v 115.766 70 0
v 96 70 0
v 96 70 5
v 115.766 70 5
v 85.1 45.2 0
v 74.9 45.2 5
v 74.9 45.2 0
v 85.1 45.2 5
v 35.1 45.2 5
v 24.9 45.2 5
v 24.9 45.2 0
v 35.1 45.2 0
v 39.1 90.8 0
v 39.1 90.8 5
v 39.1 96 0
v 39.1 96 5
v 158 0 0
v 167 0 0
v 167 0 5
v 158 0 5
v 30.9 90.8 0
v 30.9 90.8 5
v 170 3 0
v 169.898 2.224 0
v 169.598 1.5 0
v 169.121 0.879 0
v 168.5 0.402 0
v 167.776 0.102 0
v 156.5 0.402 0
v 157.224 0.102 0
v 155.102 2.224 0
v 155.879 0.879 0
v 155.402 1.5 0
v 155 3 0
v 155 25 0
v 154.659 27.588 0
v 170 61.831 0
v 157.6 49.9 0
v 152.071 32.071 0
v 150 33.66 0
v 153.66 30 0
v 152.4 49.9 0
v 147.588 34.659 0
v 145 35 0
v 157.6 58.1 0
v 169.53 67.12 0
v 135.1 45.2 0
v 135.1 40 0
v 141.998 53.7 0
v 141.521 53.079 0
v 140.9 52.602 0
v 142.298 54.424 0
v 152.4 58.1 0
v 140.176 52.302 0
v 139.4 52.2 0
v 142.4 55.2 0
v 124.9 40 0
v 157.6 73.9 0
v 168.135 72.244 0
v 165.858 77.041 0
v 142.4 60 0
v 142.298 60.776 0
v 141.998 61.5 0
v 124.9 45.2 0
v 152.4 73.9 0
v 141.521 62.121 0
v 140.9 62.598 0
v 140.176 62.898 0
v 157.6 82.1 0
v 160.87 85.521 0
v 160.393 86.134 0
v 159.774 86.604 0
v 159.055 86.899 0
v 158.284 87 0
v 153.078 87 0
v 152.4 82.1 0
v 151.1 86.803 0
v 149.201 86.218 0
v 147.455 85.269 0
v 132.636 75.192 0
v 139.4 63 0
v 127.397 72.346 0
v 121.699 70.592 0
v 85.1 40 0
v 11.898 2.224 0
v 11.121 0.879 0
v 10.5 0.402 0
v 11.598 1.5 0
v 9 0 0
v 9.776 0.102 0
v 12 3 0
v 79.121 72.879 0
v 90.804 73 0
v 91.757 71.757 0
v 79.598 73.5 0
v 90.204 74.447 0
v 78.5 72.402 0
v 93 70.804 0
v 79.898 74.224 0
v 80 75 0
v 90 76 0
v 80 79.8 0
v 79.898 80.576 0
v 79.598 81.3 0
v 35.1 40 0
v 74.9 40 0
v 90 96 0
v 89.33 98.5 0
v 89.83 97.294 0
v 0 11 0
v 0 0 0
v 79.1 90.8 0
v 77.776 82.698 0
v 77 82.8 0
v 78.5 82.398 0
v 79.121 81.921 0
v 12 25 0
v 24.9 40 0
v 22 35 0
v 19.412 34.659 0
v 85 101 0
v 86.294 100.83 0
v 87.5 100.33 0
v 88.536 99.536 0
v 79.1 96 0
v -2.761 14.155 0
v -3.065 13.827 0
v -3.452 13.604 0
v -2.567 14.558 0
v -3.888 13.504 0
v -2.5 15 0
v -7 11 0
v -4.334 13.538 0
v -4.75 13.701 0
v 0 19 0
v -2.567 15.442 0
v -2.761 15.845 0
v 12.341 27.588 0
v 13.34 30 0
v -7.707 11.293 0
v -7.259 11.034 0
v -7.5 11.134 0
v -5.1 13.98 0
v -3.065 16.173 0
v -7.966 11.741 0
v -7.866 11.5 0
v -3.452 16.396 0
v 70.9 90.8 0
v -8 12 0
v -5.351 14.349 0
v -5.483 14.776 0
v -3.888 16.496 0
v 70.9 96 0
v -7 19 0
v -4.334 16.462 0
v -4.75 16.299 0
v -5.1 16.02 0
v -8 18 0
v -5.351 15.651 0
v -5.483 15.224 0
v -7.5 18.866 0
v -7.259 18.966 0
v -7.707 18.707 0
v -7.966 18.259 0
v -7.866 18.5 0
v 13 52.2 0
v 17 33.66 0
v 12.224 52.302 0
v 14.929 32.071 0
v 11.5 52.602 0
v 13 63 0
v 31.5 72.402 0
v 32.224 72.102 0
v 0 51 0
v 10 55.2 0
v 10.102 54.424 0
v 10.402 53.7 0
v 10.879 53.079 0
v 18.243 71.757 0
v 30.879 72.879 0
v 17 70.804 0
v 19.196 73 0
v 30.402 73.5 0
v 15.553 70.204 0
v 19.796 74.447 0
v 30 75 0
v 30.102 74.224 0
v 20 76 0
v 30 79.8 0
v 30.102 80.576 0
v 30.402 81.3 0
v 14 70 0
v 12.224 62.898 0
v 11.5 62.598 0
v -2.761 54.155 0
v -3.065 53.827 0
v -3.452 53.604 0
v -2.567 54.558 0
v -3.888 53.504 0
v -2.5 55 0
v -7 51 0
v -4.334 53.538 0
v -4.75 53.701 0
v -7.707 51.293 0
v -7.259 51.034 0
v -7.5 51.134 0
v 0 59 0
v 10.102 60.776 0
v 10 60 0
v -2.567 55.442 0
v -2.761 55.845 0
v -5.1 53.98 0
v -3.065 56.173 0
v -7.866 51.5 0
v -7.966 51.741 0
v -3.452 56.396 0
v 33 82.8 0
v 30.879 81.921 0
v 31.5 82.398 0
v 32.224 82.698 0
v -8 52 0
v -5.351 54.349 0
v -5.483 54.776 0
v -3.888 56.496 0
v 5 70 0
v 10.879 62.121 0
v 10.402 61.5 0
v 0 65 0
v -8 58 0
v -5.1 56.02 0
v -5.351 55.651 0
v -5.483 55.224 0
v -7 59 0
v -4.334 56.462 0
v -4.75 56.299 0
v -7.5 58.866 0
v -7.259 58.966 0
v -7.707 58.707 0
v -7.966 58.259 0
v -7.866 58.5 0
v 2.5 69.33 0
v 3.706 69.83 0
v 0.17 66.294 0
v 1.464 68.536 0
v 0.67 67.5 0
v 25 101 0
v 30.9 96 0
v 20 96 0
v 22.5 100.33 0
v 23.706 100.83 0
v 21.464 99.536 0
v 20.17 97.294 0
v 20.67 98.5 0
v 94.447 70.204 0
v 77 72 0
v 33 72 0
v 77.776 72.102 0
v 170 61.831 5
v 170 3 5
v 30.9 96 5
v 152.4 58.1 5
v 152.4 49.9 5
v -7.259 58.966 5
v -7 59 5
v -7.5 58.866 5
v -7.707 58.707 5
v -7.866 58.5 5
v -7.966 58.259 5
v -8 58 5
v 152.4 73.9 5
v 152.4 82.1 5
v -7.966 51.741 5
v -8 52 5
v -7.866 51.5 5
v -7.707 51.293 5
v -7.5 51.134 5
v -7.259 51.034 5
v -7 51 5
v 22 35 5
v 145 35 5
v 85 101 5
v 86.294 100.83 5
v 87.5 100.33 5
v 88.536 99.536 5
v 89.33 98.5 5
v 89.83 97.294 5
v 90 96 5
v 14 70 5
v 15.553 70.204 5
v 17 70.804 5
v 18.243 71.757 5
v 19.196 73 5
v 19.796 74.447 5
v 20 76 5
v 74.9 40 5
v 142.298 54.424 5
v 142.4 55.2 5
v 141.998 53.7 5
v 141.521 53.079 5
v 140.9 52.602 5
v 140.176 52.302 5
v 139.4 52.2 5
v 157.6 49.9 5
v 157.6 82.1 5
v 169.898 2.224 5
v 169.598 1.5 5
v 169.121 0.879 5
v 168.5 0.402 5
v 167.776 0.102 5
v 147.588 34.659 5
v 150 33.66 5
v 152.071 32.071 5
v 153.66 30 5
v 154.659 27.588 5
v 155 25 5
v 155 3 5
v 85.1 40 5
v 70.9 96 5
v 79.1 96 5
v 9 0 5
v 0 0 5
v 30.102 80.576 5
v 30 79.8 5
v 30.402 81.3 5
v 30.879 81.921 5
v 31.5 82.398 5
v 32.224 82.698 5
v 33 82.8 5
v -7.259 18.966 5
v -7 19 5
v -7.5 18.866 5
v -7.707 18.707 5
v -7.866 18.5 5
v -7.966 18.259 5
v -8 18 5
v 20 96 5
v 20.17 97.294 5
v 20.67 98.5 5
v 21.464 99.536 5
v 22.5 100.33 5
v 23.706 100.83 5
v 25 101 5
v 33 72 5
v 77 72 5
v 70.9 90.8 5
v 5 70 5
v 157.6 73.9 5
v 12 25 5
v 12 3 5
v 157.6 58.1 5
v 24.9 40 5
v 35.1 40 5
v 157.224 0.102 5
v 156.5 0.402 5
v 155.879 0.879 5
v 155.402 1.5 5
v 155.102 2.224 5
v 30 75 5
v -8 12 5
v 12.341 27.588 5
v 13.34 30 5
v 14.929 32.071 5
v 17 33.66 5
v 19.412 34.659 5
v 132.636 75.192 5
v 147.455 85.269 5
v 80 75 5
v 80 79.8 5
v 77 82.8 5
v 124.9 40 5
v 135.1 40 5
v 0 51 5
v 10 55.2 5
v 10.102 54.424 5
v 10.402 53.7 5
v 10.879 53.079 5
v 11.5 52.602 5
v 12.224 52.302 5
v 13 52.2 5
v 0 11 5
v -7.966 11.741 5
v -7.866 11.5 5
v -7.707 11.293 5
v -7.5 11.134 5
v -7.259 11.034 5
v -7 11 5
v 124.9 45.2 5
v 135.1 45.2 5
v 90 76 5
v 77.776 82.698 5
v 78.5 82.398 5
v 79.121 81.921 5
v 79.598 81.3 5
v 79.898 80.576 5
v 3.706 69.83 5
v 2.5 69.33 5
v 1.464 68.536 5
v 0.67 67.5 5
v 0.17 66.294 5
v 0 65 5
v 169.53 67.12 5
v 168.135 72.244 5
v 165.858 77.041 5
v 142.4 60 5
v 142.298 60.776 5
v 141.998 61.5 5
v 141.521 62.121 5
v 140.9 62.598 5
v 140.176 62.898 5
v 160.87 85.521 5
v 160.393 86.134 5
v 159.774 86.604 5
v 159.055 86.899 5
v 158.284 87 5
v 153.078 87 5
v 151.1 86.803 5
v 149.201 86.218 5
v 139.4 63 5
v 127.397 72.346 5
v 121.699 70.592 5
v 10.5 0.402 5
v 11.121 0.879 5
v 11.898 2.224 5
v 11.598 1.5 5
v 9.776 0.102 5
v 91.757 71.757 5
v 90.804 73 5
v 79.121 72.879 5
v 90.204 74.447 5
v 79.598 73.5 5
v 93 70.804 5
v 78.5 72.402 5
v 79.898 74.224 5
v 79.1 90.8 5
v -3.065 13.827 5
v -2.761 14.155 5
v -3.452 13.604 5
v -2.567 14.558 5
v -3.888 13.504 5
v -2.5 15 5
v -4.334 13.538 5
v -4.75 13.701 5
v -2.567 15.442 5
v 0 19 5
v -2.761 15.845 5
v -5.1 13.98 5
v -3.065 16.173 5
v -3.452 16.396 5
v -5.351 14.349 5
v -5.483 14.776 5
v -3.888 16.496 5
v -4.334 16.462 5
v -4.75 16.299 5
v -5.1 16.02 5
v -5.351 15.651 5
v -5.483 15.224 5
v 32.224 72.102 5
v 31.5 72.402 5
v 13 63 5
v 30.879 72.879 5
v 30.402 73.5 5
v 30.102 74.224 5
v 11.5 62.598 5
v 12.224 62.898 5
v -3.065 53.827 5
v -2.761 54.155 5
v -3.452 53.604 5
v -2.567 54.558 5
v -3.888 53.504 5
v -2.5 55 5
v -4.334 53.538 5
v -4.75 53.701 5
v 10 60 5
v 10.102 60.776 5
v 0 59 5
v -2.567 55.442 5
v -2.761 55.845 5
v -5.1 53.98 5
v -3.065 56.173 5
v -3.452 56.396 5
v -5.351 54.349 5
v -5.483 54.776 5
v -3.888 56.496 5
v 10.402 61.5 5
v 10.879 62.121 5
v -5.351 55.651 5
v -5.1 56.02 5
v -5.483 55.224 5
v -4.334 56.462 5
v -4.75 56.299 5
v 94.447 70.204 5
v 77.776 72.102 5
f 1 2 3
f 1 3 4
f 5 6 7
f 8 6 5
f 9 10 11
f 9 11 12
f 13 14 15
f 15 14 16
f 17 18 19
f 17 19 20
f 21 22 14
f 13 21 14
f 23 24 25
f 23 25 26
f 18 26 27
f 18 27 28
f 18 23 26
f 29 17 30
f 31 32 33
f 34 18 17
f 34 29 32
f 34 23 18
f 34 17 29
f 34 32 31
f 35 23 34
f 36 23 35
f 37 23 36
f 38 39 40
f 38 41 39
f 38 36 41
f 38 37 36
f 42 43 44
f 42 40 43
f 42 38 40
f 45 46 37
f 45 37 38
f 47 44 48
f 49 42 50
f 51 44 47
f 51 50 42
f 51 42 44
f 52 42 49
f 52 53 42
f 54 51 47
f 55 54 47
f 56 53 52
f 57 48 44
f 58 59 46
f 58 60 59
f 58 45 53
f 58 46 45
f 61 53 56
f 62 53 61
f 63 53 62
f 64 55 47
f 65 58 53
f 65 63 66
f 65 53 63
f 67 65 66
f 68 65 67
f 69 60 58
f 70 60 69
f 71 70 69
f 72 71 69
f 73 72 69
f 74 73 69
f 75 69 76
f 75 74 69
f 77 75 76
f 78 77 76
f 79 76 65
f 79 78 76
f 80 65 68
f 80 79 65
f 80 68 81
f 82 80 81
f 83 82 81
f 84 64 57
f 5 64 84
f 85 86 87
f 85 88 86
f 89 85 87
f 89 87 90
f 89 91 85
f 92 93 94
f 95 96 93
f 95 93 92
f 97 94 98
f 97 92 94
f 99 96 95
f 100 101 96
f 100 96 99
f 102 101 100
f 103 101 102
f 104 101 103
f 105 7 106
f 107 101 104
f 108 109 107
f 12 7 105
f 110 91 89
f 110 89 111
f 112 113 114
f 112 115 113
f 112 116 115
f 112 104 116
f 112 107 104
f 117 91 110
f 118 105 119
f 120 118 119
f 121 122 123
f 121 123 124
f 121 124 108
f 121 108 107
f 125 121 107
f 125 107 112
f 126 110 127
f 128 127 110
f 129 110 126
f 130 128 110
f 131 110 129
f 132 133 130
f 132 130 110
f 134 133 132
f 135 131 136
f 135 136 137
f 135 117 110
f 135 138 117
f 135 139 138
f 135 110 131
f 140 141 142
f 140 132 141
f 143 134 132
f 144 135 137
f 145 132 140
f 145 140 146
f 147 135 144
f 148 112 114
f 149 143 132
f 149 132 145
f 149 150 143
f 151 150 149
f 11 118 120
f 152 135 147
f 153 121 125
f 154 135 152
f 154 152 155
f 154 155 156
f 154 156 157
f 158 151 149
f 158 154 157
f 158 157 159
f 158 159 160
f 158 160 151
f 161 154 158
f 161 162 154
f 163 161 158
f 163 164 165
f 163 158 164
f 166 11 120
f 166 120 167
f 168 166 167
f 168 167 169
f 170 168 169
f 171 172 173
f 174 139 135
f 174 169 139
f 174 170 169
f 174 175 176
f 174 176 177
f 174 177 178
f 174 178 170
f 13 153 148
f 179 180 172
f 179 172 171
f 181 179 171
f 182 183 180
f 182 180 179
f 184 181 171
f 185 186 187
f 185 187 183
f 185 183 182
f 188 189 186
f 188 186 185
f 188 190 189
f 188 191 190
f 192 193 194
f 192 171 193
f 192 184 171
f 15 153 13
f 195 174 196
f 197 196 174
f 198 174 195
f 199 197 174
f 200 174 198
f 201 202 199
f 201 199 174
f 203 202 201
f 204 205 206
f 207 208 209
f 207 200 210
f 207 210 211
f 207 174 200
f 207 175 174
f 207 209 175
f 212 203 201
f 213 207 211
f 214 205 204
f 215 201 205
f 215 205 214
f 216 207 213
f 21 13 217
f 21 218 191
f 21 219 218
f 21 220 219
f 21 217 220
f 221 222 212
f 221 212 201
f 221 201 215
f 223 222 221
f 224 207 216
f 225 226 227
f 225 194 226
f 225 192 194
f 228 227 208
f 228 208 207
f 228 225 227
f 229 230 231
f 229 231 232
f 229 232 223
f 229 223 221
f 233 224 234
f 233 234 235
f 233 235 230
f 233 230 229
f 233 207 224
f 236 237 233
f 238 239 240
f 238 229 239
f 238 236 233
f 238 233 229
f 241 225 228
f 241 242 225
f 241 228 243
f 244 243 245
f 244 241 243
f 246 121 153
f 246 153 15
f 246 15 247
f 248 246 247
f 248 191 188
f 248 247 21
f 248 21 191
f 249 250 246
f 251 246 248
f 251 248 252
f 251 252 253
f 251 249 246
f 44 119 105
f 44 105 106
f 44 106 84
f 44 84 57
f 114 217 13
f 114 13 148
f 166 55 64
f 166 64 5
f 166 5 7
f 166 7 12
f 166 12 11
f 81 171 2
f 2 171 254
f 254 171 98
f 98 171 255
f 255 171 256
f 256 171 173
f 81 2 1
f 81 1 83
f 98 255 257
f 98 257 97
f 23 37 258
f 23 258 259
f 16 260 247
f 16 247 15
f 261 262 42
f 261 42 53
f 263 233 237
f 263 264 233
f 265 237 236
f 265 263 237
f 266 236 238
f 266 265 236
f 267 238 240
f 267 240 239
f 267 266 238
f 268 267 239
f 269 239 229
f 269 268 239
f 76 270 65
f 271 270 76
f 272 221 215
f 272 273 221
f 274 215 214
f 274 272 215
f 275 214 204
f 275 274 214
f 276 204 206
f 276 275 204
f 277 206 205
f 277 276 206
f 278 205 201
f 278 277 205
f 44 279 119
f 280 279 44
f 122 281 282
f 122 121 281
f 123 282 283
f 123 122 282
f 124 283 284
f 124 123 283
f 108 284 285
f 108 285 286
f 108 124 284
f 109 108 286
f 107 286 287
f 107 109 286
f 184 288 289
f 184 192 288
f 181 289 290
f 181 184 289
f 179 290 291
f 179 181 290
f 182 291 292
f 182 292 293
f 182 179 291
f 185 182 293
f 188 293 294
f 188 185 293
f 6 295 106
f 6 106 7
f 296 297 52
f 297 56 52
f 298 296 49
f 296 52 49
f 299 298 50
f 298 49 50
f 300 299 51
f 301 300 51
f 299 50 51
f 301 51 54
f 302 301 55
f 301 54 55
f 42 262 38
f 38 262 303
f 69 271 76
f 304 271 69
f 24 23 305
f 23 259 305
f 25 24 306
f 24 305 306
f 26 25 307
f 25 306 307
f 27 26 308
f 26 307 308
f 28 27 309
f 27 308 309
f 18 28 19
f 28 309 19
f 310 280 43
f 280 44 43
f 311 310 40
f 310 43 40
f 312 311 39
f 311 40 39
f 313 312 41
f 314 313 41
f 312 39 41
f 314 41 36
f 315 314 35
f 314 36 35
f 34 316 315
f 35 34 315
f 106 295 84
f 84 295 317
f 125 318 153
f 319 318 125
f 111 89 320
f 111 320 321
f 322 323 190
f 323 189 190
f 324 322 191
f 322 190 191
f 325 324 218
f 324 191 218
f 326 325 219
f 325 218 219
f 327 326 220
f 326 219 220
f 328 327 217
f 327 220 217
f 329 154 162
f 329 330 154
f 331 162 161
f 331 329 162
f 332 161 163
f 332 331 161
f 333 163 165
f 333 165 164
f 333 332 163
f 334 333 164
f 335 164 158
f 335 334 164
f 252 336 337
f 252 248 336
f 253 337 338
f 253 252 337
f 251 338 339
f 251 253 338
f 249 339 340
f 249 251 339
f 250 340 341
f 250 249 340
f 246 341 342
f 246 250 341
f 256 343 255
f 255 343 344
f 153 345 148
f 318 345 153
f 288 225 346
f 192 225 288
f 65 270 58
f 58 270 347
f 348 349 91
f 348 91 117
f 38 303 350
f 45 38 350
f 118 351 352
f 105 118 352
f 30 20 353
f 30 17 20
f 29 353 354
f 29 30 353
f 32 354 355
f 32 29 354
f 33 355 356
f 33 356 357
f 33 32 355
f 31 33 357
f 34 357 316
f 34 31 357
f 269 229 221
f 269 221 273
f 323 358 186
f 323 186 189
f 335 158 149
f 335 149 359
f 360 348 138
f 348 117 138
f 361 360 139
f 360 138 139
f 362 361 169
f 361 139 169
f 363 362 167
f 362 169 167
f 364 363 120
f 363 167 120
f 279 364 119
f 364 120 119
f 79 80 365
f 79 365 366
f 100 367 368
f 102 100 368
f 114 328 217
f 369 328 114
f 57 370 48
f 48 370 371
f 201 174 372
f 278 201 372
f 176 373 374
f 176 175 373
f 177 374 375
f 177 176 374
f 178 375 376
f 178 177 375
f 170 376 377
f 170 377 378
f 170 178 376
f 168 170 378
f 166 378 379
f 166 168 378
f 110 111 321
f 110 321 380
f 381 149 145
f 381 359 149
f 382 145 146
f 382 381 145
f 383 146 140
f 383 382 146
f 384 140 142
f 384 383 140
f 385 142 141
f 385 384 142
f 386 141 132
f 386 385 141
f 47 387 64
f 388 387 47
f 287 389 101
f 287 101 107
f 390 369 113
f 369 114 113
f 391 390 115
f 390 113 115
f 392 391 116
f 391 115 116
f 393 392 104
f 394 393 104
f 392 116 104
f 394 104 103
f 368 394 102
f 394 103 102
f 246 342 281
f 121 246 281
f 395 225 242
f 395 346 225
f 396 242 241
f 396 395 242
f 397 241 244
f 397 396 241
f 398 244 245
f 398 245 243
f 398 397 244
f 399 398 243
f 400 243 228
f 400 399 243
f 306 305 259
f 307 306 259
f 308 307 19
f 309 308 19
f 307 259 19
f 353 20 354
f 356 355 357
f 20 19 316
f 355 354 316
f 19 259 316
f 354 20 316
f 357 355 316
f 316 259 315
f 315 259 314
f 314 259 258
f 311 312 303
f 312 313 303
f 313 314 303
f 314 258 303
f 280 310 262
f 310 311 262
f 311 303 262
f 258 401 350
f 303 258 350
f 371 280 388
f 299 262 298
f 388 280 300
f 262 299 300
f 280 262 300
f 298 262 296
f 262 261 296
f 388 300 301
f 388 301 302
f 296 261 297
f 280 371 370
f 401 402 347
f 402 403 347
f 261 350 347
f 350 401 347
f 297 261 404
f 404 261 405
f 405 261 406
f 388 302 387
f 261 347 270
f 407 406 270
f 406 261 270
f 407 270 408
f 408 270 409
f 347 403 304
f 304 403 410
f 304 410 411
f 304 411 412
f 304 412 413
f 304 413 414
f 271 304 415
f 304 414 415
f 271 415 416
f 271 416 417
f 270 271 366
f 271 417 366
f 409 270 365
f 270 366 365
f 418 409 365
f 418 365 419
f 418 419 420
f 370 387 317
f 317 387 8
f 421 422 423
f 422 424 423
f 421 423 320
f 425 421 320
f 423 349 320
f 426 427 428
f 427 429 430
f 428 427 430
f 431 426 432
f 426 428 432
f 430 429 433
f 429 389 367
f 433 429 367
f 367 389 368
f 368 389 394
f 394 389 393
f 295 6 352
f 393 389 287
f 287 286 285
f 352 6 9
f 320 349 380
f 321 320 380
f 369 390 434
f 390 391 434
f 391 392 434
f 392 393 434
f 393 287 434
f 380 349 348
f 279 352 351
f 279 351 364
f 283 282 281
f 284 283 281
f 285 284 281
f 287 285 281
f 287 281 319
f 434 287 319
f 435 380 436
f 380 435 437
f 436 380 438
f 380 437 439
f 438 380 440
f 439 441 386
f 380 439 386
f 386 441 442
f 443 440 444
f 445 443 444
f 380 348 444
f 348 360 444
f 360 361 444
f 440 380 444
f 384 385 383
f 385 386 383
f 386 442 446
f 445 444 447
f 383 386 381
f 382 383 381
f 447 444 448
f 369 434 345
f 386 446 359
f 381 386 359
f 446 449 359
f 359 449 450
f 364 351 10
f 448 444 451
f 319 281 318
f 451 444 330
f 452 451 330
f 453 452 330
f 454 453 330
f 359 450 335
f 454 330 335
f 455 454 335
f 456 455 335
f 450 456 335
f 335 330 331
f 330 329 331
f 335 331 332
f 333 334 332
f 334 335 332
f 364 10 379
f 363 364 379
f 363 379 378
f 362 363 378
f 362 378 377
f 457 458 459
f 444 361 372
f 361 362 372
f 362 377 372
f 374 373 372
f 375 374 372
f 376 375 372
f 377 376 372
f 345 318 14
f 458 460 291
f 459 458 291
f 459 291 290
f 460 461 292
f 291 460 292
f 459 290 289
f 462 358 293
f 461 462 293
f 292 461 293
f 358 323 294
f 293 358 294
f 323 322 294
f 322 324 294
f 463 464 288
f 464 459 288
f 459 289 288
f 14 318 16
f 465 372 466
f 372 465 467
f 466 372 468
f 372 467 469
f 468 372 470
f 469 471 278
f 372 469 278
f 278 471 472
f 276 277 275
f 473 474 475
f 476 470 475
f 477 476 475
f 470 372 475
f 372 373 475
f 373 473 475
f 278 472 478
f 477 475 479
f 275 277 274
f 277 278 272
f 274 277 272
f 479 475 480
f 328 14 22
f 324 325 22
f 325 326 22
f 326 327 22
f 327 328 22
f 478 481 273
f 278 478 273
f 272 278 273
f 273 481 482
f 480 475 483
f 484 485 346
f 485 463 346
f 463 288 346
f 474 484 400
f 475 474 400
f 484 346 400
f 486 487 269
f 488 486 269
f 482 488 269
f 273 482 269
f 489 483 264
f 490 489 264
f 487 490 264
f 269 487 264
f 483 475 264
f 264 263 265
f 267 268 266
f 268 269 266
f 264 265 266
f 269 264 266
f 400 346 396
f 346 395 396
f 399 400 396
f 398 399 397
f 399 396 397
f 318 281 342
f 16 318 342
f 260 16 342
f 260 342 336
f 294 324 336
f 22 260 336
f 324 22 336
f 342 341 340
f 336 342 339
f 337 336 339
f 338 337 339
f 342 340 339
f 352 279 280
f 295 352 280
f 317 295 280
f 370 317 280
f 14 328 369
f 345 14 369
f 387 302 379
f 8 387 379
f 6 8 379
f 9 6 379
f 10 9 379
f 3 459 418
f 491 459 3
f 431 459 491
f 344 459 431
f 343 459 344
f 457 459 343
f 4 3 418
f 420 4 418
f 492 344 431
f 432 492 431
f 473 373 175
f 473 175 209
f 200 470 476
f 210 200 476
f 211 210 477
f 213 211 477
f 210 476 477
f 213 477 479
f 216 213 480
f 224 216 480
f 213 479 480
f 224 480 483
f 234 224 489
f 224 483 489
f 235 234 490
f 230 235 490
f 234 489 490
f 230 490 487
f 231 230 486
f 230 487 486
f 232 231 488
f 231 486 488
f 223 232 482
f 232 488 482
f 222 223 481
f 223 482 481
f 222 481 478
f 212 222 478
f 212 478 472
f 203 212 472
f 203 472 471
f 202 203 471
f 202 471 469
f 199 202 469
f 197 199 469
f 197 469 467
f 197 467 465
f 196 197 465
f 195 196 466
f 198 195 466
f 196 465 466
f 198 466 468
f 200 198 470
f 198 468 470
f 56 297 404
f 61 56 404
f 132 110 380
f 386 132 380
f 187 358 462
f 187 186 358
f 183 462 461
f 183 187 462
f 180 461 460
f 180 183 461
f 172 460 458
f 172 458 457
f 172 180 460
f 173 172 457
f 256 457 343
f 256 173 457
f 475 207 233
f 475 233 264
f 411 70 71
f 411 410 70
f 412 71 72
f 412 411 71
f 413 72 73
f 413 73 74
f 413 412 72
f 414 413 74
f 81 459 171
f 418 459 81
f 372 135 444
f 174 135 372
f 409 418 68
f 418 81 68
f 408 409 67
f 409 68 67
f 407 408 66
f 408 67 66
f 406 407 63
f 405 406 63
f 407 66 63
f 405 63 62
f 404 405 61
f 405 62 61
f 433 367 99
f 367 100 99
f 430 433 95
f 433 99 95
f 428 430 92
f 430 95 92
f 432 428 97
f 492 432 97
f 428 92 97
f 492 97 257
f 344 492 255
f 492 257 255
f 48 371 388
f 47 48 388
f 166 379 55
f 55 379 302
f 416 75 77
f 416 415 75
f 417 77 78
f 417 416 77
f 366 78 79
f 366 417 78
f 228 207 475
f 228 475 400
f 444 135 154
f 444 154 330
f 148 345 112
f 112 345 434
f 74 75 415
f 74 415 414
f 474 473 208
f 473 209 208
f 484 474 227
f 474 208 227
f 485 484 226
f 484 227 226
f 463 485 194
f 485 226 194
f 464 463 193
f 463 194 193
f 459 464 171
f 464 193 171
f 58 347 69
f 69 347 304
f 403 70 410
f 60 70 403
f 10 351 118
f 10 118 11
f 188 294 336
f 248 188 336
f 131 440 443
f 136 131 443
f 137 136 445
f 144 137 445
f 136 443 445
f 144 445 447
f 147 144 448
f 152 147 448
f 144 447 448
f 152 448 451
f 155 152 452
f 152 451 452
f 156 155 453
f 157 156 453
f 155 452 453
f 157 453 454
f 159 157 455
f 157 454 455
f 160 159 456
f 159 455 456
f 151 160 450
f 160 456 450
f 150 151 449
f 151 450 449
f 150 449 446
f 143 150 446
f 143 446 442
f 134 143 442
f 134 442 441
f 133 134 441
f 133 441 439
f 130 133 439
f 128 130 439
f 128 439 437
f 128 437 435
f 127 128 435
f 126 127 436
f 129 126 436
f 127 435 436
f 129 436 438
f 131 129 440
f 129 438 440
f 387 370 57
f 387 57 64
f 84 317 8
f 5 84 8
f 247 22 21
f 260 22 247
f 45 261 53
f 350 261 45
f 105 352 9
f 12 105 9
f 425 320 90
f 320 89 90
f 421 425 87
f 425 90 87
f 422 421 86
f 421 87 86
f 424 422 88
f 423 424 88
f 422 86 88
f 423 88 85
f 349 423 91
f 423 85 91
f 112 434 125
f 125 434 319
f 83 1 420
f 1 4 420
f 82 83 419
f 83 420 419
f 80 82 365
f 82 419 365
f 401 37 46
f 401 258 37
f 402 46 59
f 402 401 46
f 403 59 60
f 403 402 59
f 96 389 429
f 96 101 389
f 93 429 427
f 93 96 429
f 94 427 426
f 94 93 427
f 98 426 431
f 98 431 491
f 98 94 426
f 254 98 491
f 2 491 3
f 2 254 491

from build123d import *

# Parameters (mm, degrees)
SALIENTE_EXTRUIR1_DEPTH = 5
CROQUIS2_W              = 143
CROQUIS2_H              = 35
CORTAR_EXTRUIR1_DEPTH   = 5
REDONDEO1_R             = 10
CROQUIS3_W              = 5
CROQUIS3_H              = 8
SALIENTE_EXTRUIR2_DEPTH = 8
REDONDEO2_R             = 30
REDONDEO3_R             = 3
CROQUIS4_W              = 5.2
CROQUIS4_H              = 8.2
CORTAR_EXTRUIR2_DEPTH   = 192.034028382
REDONDEO4_R             = 3
REDONDEO5_R             = 10
REDONDEO6_R             = 1
CROQUIS5_R              = 1.5
CORTAR_EXTRUIR3_DEPTH   = 5
CROQUIS6_W              = 10.2
CROQUIS6_H              = 5.2
CORTAR_EXTRUIR4_DEPTH   = 5
CROQUIS7_W              = 132.4
CROQUIS7_H              = 10.8
CORTAR_EXTRUIR5_DEPTH   = 5
REDONDEO8_R             = 3
CROQUIS8_W              = 70
CROQUIS8_H              = 31
SALIENTE_EXTRUIR3_DEPTH = 5
CROQUIS9_W              = 8.2
CROQUIS9_H              = 5.2
CORTAR_EXTRUIR6_DEPTH   = 5
CROQUIS10_W             = 50
CROQUIS10_H             = 10.8
CORTAR_EXTRUIR7_DEPTH   = 5
REDONDEO9_R             = 3
REDONDEO10_R            = 6
REDONDEO11_R            = 5
REDONDEO12_R            = 5


with BuildPart() as part:
    # Croquis1 → Saliente-Extruir1 (new body)
    with BuildSketch(Plane.XY):
        Polygon((0, 0), (0, 70), (125, 70), (150, 87), (160, 87), (170, 70), (170, 0), align=None)
    extrude(amount=SALIENTE_EXTRUIR1_DEPTH)

    # Croquis2 → Cortar-Extruir1 (cut)
    with BuildSketch(Plane.XY.offset(5)):
        with Locations((83.5, 17.5)):
            Rectangle(CROQUIS2_W, CROQUIS2_H)
    extrude(amount=-CORTAR_EXTRUIR1_DEPTH, mode=Mode.SUBTRACT)

    # Redondeo1
    redondeo1_edges = [part.edges().sort_by_distance(p)[0] for p in [
        (12, 35, 2.5),
        (155, 35, 2.5),
    ]]
    fillet(redondeo1_edges, radius=REDONDEO1_R)

    # Croquis3 → Saliente-Extruir2 (add)
    with BuildSketch(Plane.ZY):
        with Locations((2.5, 15)):
            Rectangle(CROQUIS3_W, CROQUIS3_H)
        with Locations((2.5, 55)):
            Rectangle(CROQUIS3_W, CROQUIS3_H)
    extrude(amount=SALIENTE_EXTRUIR2_DEPTH)

    # Redondeo2
    redondeo2_edges = [part.edges().sort_by_distance(p)[0] for p in [
        (125, 70, 2.5),
        (170, 70, 2.5),
    ]]
    fillet(redondeo2_edges, radius=REDONDEO2_R)

    # Redondeo3
    redondeo3_edges = [part.edges().sort_by_distance(p)[0] for p in [
        (170, 0, 2.5),
        (12, 0, 2.5),
        (155, 0, 2.5),
    ]]
    fillet(redondeo3_edges, radius=REDONDEO3_R)

    # Croquis4 → Cortar-Extruir2 (cut, through all)
    with BuildSketch(Plane.XY.offset(5)):
        with Locations((155, 78)):
            Rectangle(CROQUIS4_W, CROQUIS4_H)
        with Locations((155, 54)):
            Rectangle(CROQUIS4_W, CROQUIS4_H)
    extrude(amount=-CORTAR_EXTRUIR2_DEPTH, mode=Mode.SUBTRACT)

    # Redondeo4
    redondeo4_edges = [part.edges().sort_by_distance(p)[0] for p in [
        (160, 87, 2.5),
    ]]
    fillet(redondeo4_edges, radius=REDONDEO4_R)

    # Redondeo5
    redondeo5_edges = [part.edges().sort_by_distance(p)[0] for p in [
        (150, 87, 2.5),
    ]]
    fillet(redondeo5_edges, radius=REDONDEO5_R)

    # Redondeo6
    redondeo6_edges = [part.edges().sort_by_distance(p)[0] for p in [
        (-8, 19, 2.5),
        (-8, 11, 2.5),
        (-8, 59, 2.5),
        (-8, 51, 2.5),
    ]]
    fillet(redondeo6_edges, radius=REDONDEO6_R)

    # Croquis5 → Cortar-Extruir3 (cut)
    with BuildSketch(Plane.XY.offset(5)):
        with Locations((-4, 55)):
            Circle(CROQUIS5_R)
        with Locations((-4, 15)):
            Circle(CROQUIS5_R)
    extrude(amount=-CORTAR_EXTRUIR3_DEPTH, mode=Mode.SUBTRACT)

    # Croquis6 → Cortar-Extruir4 (cut)
    with BuildSketch(Plane.XY.offset(5)):
        with Locations((80, 42.6)):
            Rectangle(CROQUIS6_W, CROQUIS6_H)
        with Locations((30, 42.6)):
            Rectangle(CROQUIS6_W, CROQUIS6_H)
        with Locations((130, 42.6)):
            Rectangle(CROQUIS6_W, CROQUIS6_H)
    extrude(amount=-CORTAR_EXTRUIR4_DEPTH, mode=Mode.SUBTRACT)

    # Croquis7 → Cortar-Extruir5 (cut)
    with BuildSketch(Plane.XY.offset(5)):
        with Locations((76.2, 57.6)):
            Rectangle(CROQUIS7_W, CROQUIS7_H)
    extrude(amount=-CORTAR_EXTRUIR5_DEPTH, mode=Mode.SUBTRACT)

    # Redondeo8
    redondeo8_edges = [part.edges().sort_by_distance(p)[0] for p in [
        (10, 52.2, 2.5),
        (10, 63, 2.5),
        (142.4, 63, 2.5),
        (142.4, 52.2, 2.5),
    ]]
    fillet(redondeo8_edges, radius=REDONDEO8_R)

    # Croquis8 → Saliente-Extruir3 (add)
    with BuildSketch(Plane.XY.offset(5)):
        with Locations((55, 85.5)):
            Rectangle(CROQUIS8_W, CROQUIS8_H)
    extrude(amount=-SALIENTE_EXTRUIR3_DEPTH)

    # Croquis9 → Cortar-Extruir6 (cut)
    with BuildSketch(Plane.XY.offset(5)):
        with Locations((35, 93.4)):
            Rectangle(CROQUIS9_W, CROQUIS9_H)
        with Locations((75, 93.4)):
            Rectangle(CROQUIS9_W, CROQUIS9_H)
    extrude(amount=-CORTAR_EXTRUIR6_DEPTH, mode=Mode.SUBTRACT)

    # Croquis10 → Cortar-Extruir7 (cut)
    with BuildSketch(Plane.XY.offset(5)):
        with Locations((55, 77.4)):
            Rectangle(CROQUIS10_W, CROQUIS10_H)
    extrude(amount=-CORTAR_EXTRUIR7_DEPTH, mode=Mode.SUBTRACT)

    # Redondeo9
    redondeo9_edges = [part.edges().sort_by_distance(p)[0] for p in [
        (30, 72, 2.5),
        (30, 82.8, 2.5),
        (80, 82.8, 2.5),
        (80, 72, 2.5),
    ]]
    fillet(redondeo9_edges, radius=REDONDEO9_R)

    # Redondeo10
    redondeo10_edges = [part.edges().sort_by_distance(p)[0] for p in [
        (20, 70, 2.5),
        (90, 70, 2.5),
    ]]
    fillet(redondeo10_edges, radius=REDONDEO10_R)

    # Redondeo11
    redondeo11_edges = [part.edges().sort_by_distance(p)[0] for p in [
        (20, 101, 2.5),
        (90, 101, 2.5),
    ]]
    fillet(redondeo11_edges, radius=REDONDEO11_R)

    # Redondeo12
    redondeo12_edges = [part.edges().sort_by_distance(p)[0] for p in [
        (0, 70, 2.5),
    ]]
    fillet(redondeo12_edges, radius=REDONDEO12_R)


solid = part.part
